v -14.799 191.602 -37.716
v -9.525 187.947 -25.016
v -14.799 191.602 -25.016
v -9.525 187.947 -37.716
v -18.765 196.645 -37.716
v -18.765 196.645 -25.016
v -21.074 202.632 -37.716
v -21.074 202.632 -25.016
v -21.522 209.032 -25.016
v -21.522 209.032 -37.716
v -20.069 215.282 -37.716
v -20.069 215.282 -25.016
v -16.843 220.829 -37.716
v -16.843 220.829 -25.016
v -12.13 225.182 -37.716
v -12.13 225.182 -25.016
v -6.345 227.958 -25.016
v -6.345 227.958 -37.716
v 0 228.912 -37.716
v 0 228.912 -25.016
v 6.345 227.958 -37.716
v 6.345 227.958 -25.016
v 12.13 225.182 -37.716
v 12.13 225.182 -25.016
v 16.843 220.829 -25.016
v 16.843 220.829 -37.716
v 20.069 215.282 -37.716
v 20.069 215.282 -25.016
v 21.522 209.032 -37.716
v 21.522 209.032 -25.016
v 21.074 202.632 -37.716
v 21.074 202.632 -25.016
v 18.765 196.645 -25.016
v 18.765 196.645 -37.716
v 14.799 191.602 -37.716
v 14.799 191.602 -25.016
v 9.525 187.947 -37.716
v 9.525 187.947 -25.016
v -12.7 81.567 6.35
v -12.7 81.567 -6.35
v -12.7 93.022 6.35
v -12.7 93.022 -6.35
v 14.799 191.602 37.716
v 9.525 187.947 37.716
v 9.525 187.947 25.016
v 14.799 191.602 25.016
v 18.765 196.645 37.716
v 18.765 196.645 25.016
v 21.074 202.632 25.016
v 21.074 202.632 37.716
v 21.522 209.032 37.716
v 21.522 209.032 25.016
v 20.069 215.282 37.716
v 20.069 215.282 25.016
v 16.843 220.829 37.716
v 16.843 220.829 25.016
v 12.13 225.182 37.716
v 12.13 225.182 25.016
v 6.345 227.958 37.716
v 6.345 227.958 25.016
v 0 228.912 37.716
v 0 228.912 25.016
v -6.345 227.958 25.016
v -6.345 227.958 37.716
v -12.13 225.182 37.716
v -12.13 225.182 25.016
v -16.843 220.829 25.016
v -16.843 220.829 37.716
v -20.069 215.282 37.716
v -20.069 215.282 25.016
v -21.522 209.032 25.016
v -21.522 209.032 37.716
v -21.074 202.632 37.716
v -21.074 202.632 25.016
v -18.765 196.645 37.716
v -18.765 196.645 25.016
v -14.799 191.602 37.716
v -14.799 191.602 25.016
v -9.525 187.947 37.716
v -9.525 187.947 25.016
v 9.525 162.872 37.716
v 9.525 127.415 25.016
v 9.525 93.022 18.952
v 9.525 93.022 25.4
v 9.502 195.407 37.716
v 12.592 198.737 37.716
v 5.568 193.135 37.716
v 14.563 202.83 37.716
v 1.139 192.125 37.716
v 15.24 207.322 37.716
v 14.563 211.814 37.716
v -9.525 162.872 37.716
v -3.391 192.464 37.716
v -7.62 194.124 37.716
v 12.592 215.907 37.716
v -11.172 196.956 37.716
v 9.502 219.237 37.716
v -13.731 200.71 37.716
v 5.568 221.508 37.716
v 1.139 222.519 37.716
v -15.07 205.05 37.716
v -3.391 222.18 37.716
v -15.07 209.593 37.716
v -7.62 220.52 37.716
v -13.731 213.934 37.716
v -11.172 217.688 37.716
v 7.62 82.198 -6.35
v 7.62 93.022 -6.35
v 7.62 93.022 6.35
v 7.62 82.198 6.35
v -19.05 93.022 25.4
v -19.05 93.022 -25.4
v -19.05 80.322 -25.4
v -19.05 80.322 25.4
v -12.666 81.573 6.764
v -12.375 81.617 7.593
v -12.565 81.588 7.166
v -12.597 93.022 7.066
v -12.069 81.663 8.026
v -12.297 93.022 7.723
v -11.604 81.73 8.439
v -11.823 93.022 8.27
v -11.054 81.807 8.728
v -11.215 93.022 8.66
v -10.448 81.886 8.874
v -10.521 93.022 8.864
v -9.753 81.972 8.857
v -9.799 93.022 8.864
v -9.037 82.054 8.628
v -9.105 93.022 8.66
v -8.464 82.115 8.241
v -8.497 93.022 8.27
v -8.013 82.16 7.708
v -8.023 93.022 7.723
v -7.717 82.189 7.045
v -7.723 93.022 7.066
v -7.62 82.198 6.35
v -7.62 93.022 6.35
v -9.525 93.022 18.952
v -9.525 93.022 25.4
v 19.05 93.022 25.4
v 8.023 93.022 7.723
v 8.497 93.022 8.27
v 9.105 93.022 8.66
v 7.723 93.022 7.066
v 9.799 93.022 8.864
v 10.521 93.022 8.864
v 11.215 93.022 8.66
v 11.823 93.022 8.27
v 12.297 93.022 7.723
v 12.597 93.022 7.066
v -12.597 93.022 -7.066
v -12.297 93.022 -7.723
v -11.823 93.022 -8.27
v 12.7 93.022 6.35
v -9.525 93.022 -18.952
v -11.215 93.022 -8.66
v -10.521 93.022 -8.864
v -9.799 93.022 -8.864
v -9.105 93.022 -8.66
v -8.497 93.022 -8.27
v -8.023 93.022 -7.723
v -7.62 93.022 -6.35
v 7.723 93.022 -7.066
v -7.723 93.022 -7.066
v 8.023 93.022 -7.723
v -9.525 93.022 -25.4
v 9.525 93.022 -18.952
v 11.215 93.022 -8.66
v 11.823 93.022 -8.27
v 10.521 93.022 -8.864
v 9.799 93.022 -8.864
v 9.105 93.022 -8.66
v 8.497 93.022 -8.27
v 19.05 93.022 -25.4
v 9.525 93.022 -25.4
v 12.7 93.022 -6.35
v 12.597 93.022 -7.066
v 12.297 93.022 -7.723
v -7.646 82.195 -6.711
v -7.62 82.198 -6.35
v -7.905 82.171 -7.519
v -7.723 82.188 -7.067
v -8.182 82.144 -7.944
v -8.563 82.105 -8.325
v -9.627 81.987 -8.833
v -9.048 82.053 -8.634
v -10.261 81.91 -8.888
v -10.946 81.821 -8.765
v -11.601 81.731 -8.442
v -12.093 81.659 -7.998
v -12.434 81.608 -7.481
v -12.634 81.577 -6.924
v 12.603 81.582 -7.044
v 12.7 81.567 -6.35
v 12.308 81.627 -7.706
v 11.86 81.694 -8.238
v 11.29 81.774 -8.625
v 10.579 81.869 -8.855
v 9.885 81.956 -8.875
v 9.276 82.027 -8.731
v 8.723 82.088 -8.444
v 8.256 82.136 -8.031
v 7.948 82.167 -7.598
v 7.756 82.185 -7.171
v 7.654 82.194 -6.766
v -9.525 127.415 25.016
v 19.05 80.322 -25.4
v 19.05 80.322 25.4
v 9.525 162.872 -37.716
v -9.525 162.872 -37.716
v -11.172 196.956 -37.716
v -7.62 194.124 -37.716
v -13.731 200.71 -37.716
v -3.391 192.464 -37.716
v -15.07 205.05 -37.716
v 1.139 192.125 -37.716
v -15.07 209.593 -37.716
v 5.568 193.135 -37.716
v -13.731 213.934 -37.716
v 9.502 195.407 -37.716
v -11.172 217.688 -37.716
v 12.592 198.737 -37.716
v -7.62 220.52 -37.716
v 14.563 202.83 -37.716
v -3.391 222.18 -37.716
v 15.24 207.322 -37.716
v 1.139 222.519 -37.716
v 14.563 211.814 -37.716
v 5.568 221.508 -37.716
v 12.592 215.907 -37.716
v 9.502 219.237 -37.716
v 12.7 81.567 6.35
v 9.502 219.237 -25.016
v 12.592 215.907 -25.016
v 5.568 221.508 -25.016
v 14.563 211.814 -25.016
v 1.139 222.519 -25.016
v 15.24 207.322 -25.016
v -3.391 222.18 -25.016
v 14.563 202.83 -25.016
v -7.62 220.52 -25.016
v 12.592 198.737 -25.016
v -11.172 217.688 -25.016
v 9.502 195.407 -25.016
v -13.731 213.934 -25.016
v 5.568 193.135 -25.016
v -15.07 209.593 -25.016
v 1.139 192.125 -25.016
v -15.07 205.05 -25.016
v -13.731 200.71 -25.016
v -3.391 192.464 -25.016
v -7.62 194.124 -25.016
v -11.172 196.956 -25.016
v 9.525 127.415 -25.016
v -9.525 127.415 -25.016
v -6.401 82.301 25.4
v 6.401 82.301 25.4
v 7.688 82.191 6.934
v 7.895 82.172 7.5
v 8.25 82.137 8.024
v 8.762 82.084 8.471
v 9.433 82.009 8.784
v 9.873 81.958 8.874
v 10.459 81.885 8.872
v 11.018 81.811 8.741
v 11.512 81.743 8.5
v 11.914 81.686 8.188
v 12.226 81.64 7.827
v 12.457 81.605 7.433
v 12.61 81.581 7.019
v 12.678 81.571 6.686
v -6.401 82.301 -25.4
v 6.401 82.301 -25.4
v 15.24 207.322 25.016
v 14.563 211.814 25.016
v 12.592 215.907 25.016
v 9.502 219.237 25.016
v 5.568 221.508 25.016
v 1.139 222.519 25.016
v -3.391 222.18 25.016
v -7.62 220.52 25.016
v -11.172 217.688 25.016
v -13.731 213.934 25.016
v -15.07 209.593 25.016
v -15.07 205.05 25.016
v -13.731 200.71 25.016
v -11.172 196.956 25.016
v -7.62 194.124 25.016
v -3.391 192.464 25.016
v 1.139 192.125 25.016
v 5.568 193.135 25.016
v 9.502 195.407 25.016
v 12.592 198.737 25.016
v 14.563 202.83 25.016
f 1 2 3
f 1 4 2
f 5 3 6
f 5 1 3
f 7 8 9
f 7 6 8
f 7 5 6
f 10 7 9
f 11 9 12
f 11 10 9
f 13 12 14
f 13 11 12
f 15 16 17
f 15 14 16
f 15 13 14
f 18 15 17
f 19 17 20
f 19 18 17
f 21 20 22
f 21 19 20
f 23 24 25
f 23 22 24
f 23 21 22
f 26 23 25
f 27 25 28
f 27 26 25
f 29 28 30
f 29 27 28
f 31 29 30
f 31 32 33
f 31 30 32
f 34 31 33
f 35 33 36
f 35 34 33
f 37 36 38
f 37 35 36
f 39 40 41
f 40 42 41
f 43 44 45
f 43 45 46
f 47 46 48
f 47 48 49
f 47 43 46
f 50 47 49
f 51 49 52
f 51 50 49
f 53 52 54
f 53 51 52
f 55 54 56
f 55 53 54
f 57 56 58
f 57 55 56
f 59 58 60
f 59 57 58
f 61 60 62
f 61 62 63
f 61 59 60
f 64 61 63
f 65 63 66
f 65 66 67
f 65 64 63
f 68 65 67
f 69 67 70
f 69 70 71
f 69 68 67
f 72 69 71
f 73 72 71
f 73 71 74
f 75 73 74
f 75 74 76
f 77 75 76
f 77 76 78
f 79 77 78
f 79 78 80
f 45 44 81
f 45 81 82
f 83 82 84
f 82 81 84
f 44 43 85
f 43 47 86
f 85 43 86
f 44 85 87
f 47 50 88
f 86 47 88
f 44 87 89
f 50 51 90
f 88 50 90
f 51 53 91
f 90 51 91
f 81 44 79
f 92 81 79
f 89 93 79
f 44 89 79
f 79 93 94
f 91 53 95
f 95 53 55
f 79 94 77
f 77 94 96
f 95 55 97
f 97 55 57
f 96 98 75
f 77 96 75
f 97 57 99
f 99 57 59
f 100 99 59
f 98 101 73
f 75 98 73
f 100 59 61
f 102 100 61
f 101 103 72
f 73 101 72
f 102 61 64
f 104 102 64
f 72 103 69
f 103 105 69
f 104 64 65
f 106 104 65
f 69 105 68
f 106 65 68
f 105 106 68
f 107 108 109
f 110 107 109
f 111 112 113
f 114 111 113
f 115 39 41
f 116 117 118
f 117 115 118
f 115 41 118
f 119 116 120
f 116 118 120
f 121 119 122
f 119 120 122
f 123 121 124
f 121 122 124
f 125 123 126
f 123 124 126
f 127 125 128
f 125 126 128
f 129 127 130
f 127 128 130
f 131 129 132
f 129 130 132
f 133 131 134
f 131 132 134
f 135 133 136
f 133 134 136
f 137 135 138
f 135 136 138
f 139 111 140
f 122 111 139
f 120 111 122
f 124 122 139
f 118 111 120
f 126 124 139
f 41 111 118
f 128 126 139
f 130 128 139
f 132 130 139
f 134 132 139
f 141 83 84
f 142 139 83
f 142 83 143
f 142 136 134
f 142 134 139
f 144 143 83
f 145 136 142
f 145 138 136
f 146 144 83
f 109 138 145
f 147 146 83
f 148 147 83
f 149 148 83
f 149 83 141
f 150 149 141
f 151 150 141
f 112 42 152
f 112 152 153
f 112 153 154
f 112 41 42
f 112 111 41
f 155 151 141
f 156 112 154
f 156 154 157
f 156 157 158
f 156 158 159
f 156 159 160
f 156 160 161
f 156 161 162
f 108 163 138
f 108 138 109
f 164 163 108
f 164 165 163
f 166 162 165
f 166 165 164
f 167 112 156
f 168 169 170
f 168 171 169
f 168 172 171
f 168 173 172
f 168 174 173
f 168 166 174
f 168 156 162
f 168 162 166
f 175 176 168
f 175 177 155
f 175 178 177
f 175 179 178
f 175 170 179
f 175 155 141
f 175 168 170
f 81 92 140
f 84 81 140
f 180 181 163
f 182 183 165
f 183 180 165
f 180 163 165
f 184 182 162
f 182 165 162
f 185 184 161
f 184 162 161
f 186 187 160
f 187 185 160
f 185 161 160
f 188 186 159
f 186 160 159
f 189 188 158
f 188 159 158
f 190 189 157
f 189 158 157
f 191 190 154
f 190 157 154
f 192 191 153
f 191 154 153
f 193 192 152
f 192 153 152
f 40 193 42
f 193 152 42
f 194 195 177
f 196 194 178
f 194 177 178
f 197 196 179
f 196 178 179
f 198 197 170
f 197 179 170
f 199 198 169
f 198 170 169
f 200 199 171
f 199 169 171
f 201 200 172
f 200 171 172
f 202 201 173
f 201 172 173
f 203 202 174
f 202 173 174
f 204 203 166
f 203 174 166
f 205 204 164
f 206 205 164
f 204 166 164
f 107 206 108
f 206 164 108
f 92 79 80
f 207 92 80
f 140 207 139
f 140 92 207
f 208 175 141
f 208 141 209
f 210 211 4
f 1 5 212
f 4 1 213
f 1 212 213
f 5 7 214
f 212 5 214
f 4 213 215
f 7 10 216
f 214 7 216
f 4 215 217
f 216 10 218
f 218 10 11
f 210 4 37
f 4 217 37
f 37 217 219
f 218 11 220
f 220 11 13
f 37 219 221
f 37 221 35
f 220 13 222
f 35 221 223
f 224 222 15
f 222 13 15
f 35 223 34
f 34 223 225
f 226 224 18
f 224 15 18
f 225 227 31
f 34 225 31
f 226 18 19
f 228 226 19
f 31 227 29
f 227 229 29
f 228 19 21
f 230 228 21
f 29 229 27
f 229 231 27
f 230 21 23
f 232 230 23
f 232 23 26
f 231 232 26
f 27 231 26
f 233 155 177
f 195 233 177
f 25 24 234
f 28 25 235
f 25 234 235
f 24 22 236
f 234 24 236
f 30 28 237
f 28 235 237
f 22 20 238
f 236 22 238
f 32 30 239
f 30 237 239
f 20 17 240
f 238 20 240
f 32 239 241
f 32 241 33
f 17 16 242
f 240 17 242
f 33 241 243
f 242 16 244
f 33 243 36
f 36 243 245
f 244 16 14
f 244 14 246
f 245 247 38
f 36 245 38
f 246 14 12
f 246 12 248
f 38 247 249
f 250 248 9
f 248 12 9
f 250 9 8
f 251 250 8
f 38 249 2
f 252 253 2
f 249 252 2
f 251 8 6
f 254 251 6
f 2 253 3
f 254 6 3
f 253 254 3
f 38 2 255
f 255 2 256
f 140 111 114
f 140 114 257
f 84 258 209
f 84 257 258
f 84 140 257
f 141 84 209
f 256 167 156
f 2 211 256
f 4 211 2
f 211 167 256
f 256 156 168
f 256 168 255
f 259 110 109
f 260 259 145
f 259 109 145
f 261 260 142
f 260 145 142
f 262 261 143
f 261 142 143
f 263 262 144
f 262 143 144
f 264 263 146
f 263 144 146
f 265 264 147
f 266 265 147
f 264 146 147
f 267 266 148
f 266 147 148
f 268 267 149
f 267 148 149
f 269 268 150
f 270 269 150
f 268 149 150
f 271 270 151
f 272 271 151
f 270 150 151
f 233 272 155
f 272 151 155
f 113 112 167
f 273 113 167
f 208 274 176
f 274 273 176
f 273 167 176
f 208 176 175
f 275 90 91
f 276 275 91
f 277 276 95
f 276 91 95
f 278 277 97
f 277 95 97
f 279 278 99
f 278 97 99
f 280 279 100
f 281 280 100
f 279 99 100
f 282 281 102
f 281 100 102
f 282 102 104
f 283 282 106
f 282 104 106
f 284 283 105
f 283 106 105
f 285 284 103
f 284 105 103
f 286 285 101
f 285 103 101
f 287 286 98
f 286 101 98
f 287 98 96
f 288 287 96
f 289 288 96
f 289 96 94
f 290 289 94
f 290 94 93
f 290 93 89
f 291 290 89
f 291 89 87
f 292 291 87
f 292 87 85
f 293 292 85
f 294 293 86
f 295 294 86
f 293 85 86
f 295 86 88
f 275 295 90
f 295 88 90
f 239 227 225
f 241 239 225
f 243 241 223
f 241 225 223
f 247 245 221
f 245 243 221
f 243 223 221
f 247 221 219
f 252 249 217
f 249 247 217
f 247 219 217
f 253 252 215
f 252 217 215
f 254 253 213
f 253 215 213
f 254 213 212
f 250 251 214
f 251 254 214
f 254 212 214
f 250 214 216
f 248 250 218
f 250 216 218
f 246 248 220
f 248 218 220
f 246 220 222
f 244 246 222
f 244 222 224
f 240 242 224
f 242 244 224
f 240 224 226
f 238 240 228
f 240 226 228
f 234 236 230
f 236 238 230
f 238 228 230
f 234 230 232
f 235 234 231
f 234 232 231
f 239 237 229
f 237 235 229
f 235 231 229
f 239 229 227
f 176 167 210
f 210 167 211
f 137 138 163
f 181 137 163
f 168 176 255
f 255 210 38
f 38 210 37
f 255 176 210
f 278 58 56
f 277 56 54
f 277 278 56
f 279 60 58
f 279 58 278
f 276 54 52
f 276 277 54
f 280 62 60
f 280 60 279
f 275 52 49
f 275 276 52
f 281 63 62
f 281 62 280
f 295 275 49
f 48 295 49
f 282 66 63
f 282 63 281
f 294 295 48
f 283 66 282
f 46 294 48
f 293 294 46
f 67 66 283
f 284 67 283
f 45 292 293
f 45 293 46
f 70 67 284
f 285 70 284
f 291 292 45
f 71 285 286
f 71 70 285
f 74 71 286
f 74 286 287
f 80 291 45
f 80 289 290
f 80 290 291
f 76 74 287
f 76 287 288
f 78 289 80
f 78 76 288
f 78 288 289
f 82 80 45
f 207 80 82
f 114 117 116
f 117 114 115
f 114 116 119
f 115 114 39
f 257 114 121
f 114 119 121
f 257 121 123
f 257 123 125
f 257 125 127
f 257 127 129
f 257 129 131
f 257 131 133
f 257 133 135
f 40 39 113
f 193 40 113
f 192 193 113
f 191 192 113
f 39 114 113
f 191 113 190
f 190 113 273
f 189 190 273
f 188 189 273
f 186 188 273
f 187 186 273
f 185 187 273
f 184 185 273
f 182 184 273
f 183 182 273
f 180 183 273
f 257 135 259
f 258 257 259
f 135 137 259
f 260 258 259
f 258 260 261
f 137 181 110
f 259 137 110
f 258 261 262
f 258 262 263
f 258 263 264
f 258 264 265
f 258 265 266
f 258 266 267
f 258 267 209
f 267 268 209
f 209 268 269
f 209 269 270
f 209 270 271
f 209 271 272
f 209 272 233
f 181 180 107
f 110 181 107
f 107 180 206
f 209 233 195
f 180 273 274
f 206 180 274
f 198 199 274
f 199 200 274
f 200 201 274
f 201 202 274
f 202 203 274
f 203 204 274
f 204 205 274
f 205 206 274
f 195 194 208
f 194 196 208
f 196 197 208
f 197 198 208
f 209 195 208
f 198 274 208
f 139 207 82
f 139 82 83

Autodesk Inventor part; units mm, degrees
sketch "Sketch1" plane through (0, 0, 0) normal (0, 0, 1) x (1, 0, 0)
  arc A0 (19.05, 80.3219) -> (-19.05, 80.3219) centre (0, 0) ccw
  line L0 (0, 0) -> (0, 152.4) construction
  line L1 (0, 93.0219) -> (19.05, 93.0219)
  line L2 (19.05, 93.0219) -> (19.05, 80.3219)
  line L3 (0, 93.0219) -> (-19.05, 93.0219)
  line L4 (-19.05, 93.0219) -> (-19.05, 80.3219)
  dimension "telescopeTubeDiameter" = 165.1
  dimension "d1" = 152.4
  dimension "d2" = 19.05
  dimension "d3" = 12.7
extrude "Extrusion1" add sketch "Sketch1" along normal mid plane 50.8
sketch "Sketch2" plane through (-19.05, 93.0219, 25.4) normal (0, 1, 0) x (1, 0, 0)
  line L0 (38.1, 0) -> (0, 0) construction
  line L1 (19.05, 0) -> (19.05, 50.8) construction
  line L2 (0, 50.8) -> (38.1, 50.8) construction
  line L3 (0, 50.8) -> (0, 0) construction
  line L4 (0, 25.4) -> (38.1, 25.4) construction
  line L5 (38.1, 50.8) -> (38.1, 0) construction
  line L6 (29.21, 19.05) -> (29.21, 31.75) construction
  line L7 (31.75, 19.05) -> (31.75, 31.75)
  line L8 (26.67, 31.75) -> (26.67, 19.05)
  arc A0 (26.67, 19.05) -> (31.75, 19.05) centre (29.21, 19.05) ccw
  arc A1 (31.75, 31.75) -> (26.67, 31.75) centre (29.21, 31.75) ccw
  point P0 (19.05, 25.4)
  point P1 (29.21, 25.4)
  dimension "d6" = 0
  dimension "d7" = 10.16
  dimension "d8" = 6.35
  dimension "d11" = 5.08
extrude "Extrusion2" cut sketch "Sketch2" against normal through all
mirror "Mirror1" about plane through (0, 0, 0) normal (1, 0, 0) of "Extrusion2"
sketch "Sketch3" plane through (0, 0, 0) normal (1, 0, 0) x (0, 1, 0)
  line L0 (93.0219, 25.4) -> (93.0219, -25.4) projected
  line L1 (80.3219, -25.4) -> (93.0219, -25.4) projected
  line L2 (162.8719, -25.4) -> (162.8719, -37.137) construction
  line L3 (93.0219, -25.4) -> (162.8719, -37.7164)
  line L4 (93.0219, -25.4) -> (162.8719, -25.4) construction
  line L5 (93.0219, -18.952) -> (162.8719, -31.2685)
  line L6 (162.8719, -31.2685) -> (162.8719, -37.7164)
  point P0 (0, 0)
  dimension "d13" = 69.85
  dimension "d14" = 10
  dimension "d15" = 6.35
extrude "Extrusion3" add sketch "Sketch3" along normal mid plane 19.05
ref_plane "Work Plane1" through (9.525, 162.8719, -37.7164) normal (0, 0, 1) x (1, 0, 0)
sketch "Sketch4" plane through (9.525, 162.8719, -37.7164) normal (0, 0, 1) x (1, 0, 0)
  line L0 (0, 0) -> (-19.05, 0) projected
  line L1 (-19.05, 0) -> (0, 0) construction
  line L2 (-9.525, 0) -> (-9.525, 50.8) construction
  circle A0 centre (-9.525, 44.45) radius 15.24
  arc A1 (0, 25.0747) -> (-19.05, 25.0747) centre (-9.525, 44.45) ccw
  line L3 (0, 0) -> (0, 25.0747)
  line L4 (-19.05, 0) -> (-19.05, 25.0747)
  point P0 (-9.525, -162.8719)
  dimension "d18" = 50.8
  dimension "d19" = 30.48
  dimension "d20" = 6.35
  dimension "d25" = 44.45
extrude "Extrusion4" add sketch "Sketch4" along normal blind 12.7
sketch "Sketch7" plane through (0, 0, 0) normal (1, 0, 0) x (0, 1, 0)
  line L0 (93.0219, -18.952) -> (162.8719, -31.2685) projected
  line L1 (162.8719, -31.2685) -> (162.8719, -25.0164) projected
  line L2 (162.8719, -25.0164) -> (127.4148, -25.0164)
  line L3 (127.4148, -25.0164) -> (162.8719, -31.2685)
  line L4 (187.9465, -25.0164) -> (162.8719, -25.0164) projected
  line L5 (162.8719, -31.2685) -> (162.8719, -25.0164)
  point P0 (0, 0)
extrude "Extrusion5" add sketch "Sketch7" along normal mid plane 19.05
mirror "Mirror4" about plane through (0, 0, 0) normal (0, 0, 1) of "Extrusion4", "Extrusion3"
sketch "Sketch8" plane through (0, 0, 0) normal (1, 0, 0) x (0, 1, 0)
  line L0 (162.8719, 31.2685) -> (162.8719, 25.0164) projected
  line L1 (93.0219, 18.952) -> (162.8719, 31.2685) projected
  line L2 (162.8719, 25.0164) -> (127.4148, 25.0164)
  line L3 (127.4148, 25.0164) -> (162.8719, 31.2685)
  line L4 (162.8719, 31.2685) -> (162.8719, 25.0164)
  point P0 (0, 0)
extrude "Extrusion6" add sketch "Sketch8" along normal mid plane 19.05
ref_plane "Work Plane3" through (19.05, 80.3219, 25.4) normal (0, 1, 0) x (-1, 0, 0)
ref_plane "Work Plane4" through (0, 228.9119, -25.0164) normal (0, 1, 0) x (-1, 0, 0)
equation "\"d62\" = 0.125 * Sketch12_Pitch"
equation "\"Sketch12_Pitch\" = 0.79375"
equation "\"d64\" = 60deg"
equation "\"d101\" = 55deg"
equation "\"Sketch15_Pitch\" = 0.79375"
equation "\"d119\" = 55deg"
equation "\"Sketch17_Pitch\" = 0.79375"
equation "\"d137\" = 55deg"
equation "\"Sketch19_Pitch\" = 0.79375"
equation "\"d155\" = 55deg"
equation "\"Sketch21_Pitch\" = 0.79375"
equation "\"d173\" = 55deg"
equation "\"Sketch23_Pitch\" = 0.79375"
equation "\"d191\" = 55deg"
equation "\"Sketch25_Pitch\" = 0.79375"
properties part number "finderV02"
